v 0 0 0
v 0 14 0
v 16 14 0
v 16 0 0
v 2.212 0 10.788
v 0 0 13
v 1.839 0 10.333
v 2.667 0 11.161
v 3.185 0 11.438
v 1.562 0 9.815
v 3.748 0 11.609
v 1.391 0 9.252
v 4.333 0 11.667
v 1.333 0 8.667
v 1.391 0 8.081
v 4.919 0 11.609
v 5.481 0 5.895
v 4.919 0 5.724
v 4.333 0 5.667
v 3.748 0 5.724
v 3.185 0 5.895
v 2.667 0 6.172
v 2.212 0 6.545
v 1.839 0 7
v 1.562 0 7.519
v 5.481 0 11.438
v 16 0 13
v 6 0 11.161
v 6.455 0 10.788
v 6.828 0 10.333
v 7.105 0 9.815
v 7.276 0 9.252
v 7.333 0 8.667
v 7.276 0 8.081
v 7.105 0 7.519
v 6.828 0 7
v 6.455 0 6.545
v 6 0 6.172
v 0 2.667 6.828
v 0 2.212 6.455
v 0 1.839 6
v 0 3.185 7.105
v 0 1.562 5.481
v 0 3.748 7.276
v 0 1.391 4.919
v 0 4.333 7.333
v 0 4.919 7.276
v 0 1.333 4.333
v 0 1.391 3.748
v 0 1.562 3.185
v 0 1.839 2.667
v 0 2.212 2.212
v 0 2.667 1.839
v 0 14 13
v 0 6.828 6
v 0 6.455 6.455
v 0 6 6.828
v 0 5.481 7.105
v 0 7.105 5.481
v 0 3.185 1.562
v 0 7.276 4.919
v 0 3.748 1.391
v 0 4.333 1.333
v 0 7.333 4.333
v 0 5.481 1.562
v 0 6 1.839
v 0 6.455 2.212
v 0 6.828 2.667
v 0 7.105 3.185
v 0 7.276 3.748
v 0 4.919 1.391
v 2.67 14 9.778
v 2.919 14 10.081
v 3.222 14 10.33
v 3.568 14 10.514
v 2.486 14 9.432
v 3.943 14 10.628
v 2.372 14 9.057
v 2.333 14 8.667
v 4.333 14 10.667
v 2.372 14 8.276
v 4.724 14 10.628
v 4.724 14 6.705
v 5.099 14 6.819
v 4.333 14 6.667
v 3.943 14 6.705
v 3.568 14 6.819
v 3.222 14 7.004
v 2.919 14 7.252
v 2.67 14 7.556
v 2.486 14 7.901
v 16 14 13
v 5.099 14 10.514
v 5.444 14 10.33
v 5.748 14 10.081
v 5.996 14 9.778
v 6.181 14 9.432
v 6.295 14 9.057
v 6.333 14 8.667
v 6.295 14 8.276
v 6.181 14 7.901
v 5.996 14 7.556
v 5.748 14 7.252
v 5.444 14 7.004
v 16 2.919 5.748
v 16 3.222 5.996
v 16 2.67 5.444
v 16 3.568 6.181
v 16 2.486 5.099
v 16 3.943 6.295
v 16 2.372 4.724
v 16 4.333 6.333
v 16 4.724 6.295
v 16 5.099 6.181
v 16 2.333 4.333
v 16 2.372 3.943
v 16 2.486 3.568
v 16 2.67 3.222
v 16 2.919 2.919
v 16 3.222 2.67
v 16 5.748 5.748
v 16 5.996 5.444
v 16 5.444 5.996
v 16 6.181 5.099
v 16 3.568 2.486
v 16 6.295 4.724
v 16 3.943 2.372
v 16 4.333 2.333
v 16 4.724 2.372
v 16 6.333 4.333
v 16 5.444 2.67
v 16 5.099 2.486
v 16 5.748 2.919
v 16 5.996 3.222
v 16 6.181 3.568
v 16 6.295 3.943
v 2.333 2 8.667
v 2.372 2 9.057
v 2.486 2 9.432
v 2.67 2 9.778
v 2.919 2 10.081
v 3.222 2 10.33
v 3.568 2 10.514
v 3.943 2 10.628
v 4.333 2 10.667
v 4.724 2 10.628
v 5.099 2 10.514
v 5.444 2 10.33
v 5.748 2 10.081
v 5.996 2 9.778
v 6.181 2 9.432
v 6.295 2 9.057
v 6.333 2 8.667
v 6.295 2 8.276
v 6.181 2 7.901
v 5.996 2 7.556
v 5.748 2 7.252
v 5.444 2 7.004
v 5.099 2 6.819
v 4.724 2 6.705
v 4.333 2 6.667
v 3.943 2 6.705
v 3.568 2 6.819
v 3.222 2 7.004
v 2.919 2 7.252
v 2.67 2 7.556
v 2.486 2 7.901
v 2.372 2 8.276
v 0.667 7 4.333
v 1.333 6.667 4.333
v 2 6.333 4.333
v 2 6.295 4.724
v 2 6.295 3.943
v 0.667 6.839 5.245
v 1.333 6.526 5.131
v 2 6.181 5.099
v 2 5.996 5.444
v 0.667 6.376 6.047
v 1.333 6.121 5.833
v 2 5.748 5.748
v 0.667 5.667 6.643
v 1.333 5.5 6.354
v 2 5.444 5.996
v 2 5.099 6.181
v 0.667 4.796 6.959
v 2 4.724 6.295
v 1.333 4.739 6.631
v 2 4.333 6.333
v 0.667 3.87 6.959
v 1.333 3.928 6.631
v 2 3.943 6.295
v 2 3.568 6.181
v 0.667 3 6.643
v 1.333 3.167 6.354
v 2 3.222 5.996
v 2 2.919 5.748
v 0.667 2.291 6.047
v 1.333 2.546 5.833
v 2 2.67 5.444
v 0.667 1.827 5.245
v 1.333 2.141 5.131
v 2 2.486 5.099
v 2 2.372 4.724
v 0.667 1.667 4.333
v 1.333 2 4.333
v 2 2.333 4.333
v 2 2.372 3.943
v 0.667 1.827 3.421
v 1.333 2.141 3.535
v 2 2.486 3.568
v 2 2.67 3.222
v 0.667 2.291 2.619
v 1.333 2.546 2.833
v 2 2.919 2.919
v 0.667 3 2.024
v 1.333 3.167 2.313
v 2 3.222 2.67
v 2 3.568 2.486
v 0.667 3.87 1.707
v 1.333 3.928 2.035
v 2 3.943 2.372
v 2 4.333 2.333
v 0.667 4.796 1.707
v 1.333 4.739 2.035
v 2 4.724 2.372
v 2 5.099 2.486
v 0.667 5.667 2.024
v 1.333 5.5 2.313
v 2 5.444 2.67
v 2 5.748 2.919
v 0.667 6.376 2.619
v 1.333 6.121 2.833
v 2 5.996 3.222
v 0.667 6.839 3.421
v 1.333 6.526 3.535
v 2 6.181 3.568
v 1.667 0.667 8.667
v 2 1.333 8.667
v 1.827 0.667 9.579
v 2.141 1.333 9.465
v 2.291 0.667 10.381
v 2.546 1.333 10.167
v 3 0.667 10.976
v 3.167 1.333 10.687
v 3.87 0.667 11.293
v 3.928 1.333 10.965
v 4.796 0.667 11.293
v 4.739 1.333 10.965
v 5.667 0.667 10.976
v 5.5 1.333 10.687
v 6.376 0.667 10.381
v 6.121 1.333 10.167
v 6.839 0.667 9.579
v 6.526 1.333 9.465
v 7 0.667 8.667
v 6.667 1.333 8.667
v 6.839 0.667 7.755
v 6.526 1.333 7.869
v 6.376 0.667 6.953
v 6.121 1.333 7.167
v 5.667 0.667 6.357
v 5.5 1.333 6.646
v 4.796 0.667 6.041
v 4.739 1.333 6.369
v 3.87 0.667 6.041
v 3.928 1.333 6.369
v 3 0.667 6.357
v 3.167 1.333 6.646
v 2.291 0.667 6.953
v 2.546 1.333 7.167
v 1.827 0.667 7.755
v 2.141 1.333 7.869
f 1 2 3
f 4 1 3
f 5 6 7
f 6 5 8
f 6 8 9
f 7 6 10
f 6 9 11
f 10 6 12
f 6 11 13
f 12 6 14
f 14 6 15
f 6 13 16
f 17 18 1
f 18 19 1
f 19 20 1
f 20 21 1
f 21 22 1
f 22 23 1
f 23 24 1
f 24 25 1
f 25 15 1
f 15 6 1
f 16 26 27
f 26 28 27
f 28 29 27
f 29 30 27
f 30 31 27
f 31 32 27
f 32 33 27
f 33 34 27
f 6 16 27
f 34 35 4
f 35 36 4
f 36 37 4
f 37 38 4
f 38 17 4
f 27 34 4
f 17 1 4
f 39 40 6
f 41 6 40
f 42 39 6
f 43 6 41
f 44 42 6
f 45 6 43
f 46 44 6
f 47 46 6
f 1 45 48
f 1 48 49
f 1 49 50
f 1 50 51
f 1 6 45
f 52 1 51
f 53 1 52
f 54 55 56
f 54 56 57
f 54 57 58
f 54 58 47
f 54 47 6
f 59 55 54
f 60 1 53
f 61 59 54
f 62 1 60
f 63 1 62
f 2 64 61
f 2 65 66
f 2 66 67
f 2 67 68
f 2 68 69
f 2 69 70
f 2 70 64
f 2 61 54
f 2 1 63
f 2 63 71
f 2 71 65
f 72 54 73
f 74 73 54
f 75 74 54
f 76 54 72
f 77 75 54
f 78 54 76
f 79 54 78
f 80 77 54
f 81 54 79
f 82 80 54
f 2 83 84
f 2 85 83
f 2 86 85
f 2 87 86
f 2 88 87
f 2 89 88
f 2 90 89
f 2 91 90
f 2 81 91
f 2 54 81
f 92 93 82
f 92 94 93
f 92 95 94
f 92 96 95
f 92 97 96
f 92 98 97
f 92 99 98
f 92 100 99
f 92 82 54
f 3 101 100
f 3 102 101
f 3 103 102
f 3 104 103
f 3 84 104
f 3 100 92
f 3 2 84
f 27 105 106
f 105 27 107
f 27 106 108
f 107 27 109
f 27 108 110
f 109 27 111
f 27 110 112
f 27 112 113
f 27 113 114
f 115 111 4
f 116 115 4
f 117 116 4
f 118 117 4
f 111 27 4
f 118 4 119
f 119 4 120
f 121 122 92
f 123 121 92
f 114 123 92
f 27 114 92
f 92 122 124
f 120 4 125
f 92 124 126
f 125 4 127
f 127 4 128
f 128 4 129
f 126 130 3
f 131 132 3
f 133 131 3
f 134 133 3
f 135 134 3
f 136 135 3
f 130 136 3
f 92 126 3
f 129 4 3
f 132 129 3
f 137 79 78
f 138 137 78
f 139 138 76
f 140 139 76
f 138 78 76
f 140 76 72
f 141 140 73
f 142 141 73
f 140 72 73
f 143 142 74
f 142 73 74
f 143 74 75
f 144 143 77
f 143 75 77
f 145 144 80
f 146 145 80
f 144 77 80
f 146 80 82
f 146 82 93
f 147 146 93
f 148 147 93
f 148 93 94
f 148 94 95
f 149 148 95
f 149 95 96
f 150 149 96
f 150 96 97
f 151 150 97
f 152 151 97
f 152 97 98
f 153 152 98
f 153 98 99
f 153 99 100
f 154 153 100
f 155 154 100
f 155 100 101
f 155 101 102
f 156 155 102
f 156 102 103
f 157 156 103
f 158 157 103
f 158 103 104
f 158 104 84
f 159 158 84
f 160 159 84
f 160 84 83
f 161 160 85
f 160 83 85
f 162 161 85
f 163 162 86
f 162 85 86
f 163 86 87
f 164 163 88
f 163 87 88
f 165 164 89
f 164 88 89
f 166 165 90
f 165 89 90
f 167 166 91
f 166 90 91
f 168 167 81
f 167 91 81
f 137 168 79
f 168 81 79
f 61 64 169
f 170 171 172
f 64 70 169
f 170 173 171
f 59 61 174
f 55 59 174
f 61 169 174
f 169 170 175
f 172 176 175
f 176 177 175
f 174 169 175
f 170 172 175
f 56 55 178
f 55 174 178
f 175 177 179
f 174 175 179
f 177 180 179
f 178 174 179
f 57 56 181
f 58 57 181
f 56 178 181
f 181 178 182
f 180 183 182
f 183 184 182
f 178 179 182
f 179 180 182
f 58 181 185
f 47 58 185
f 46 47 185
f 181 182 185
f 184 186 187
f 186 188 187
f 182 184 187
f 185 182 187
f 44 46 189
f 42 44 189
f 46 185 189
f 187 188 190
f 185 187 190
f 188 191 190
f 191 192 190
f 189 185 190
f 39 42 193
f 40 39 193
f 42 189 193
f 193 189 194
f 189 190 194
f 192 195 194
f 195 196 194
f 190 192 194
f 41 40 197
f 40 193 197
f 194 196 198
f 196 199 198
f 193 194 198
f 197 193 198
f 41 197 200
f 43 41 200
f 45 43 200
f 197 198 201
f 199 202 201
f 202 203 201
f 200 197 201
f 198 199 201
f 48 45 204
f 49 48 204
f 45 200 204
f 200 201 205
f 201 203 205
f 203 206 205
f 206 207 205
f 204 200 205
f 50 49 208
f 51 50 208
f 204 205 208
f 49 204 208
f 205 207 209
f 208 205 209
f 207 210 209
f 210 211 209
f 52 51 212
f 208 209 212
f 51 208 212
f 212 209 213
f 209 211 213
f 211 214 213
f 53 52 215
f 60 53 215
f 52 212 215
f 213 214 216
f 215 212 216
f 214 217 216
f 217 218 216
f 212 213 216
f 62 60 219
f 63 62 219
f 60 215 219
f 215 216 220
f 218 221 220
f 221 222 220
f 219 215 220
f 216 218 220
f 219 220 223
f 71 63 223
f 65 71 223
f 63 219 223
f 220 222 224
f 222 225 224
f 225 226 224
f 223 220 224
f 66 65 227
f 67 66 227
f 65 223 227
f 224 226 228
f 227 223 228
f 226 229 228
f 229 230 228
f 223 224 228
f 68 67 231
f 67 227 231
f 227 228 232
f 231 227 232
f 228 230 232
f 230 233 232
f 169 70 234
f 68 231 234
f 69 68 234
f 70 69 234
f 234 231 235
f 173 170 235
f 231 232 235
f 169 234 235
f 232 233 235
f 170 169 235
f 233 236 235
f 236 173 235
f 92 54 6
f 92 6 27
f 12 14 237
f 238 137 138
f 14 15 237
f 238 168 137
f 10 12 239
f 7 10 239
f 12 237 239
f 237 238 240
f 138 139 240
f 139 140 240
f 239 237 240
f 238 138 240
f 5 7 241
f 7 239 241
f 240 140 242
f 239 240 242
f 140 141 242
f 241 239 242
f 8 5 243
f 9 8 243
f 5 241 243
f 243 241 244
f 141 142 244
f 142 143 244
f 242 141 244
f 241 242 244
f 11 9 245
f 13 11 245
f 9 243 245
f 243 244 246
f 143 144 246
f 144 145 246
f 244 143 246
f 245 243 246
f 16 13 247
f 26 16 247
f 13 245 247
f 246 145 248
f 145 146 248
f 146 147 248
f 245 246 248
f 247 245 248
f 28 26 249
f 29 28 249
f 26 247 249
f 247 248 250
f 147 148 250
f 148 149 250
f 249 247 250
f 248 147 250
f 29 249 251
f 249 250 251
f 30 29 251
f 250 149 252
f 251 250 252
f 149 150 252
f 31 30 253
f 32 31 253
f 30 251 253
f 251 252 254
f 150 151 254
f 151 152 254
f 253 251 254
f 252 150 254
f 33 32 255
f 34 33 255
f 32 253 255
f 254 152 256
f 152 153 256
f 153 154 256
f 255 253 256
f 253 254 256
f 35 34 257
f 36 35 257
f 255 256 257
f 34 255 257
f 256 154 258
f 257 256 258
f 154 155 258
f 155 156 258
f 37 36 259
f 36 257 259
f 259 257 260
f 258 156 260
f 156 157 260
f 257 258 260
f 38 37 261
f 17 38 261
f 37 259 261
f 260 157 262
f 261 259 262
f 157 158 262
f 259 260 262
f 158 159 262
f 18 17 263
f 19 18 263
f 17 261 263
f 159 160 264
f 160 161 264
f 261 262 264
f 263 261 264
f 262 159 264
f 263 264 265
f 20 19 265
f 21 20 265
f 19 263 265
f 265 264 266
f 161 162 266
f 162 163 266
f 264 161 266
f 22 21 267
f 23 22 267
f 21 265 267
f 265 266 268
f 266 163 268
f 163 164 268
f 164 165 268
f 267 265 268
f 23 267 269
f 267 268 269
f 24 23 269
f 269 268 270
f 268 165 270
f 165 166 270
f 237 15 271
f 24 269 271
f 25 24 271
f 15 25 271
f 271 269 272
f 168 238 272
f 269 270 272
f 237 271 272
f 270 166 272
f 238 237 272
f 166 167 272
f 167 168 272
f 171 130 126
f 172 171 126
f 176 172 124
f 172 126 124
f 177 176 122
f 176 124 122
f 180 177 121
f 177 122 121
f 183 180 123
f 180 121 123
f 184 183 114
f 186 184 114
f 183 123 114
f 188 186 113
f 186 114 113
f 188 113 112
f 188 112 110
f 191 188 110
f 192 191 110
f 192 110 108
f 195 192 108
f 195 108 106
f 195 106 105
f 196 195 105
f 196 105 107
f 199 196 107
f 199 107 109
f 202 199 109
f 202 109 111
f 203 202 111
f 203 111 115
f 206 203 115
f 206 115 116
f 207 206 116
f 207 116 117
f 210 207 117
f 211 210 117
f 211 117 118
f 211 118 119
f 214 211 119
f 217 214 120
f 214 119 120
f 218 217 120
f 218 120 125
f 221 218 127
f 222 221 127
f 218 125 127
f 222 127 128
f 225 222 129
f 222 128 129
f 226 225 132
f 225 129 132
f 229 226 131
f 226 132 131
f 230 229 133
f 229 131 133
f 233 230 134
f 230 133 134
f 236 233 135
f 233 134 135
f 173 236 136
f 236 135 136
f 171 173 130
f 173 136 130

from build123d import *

# Parameters (mm, degrees)
SKETCH_W        = 16
SKETCH_H        = 14
PAD_DEPTH       = 13
SKETCH001_R     = 2
POCKET_DEPTH    = 16.001
SKETCH002_R     = 2
POCKET001_DEPTH = 14.001
CHAMFER_1_SIZE2 = 2
CHAMFER_1_SIZE  = 1
CHAMFER_2_SIZE2 = 2
CHAMFER_2_SIZE  = 1


with BuildPart() as part:
    # Sketch → Pad (new body)
    with BuildSketch(Plane.XY):
        with Locations((8, 7)):
            Rectangle(SKETCH_W, SKETCH_H)
    extrude(amount=PAD_DEPTH)

    # Sketch001 (on Face2 of Pad) → Pocket (cut, through all)
    with BuildSketch(Plane.YZ.offset(16)):
        with Locations((4.333333, 4.333333)):
            Circle(SKETCH001_R)
    extrude(amount=-POCKET_DEPTH, mode=Mode.SUBTRACT)

    # Sketch002 (on Face6 of Pocket) → Pocket001 (cut, through all)
    with BuildSketch(Plane(origin=(0, 14, 0), x_dir=(-1, 0, 0), z_dir=(0, 1, 0))):
        with Locations((-4.333333, 8.666667)):
            Circle(SKETCH002_R)
    extrude(amount=-POCKET001_DEPTH, mode=Mode.SUBTRACT)

    # Chamfer 1
    chamfer_1_edges = [part.edges().sort_by_distance(p)[0] for p in [
        (6.333333, 0, 8.666667),
    ]]
    chamfer_1_side = part.faces().sort_by_distance((8.235766, 0, 6.360683))[0]
    chamfer(chamfer_1_edges, length=CHAMFER_1_SIZE, length2=CHAMFER_1_SIZE2, reference=chamfer_1_side)

    # Chamfer 2
    chamfer_2_edges = [part.edges().sort_by_distance(p)[0] for p in [
        (0, 2.333333, 4.333333),
    ]]
    chamfer_2_side = part.faces().sort_by_distance((0, 7.197778, 6.660695))[0]
    chamfer(chamfer_2_edges, length=CHAMFER_2_SIZE, length2=CHAMFER_2_SIZE2, reference=chamfer_2_side)


solid = part.part
